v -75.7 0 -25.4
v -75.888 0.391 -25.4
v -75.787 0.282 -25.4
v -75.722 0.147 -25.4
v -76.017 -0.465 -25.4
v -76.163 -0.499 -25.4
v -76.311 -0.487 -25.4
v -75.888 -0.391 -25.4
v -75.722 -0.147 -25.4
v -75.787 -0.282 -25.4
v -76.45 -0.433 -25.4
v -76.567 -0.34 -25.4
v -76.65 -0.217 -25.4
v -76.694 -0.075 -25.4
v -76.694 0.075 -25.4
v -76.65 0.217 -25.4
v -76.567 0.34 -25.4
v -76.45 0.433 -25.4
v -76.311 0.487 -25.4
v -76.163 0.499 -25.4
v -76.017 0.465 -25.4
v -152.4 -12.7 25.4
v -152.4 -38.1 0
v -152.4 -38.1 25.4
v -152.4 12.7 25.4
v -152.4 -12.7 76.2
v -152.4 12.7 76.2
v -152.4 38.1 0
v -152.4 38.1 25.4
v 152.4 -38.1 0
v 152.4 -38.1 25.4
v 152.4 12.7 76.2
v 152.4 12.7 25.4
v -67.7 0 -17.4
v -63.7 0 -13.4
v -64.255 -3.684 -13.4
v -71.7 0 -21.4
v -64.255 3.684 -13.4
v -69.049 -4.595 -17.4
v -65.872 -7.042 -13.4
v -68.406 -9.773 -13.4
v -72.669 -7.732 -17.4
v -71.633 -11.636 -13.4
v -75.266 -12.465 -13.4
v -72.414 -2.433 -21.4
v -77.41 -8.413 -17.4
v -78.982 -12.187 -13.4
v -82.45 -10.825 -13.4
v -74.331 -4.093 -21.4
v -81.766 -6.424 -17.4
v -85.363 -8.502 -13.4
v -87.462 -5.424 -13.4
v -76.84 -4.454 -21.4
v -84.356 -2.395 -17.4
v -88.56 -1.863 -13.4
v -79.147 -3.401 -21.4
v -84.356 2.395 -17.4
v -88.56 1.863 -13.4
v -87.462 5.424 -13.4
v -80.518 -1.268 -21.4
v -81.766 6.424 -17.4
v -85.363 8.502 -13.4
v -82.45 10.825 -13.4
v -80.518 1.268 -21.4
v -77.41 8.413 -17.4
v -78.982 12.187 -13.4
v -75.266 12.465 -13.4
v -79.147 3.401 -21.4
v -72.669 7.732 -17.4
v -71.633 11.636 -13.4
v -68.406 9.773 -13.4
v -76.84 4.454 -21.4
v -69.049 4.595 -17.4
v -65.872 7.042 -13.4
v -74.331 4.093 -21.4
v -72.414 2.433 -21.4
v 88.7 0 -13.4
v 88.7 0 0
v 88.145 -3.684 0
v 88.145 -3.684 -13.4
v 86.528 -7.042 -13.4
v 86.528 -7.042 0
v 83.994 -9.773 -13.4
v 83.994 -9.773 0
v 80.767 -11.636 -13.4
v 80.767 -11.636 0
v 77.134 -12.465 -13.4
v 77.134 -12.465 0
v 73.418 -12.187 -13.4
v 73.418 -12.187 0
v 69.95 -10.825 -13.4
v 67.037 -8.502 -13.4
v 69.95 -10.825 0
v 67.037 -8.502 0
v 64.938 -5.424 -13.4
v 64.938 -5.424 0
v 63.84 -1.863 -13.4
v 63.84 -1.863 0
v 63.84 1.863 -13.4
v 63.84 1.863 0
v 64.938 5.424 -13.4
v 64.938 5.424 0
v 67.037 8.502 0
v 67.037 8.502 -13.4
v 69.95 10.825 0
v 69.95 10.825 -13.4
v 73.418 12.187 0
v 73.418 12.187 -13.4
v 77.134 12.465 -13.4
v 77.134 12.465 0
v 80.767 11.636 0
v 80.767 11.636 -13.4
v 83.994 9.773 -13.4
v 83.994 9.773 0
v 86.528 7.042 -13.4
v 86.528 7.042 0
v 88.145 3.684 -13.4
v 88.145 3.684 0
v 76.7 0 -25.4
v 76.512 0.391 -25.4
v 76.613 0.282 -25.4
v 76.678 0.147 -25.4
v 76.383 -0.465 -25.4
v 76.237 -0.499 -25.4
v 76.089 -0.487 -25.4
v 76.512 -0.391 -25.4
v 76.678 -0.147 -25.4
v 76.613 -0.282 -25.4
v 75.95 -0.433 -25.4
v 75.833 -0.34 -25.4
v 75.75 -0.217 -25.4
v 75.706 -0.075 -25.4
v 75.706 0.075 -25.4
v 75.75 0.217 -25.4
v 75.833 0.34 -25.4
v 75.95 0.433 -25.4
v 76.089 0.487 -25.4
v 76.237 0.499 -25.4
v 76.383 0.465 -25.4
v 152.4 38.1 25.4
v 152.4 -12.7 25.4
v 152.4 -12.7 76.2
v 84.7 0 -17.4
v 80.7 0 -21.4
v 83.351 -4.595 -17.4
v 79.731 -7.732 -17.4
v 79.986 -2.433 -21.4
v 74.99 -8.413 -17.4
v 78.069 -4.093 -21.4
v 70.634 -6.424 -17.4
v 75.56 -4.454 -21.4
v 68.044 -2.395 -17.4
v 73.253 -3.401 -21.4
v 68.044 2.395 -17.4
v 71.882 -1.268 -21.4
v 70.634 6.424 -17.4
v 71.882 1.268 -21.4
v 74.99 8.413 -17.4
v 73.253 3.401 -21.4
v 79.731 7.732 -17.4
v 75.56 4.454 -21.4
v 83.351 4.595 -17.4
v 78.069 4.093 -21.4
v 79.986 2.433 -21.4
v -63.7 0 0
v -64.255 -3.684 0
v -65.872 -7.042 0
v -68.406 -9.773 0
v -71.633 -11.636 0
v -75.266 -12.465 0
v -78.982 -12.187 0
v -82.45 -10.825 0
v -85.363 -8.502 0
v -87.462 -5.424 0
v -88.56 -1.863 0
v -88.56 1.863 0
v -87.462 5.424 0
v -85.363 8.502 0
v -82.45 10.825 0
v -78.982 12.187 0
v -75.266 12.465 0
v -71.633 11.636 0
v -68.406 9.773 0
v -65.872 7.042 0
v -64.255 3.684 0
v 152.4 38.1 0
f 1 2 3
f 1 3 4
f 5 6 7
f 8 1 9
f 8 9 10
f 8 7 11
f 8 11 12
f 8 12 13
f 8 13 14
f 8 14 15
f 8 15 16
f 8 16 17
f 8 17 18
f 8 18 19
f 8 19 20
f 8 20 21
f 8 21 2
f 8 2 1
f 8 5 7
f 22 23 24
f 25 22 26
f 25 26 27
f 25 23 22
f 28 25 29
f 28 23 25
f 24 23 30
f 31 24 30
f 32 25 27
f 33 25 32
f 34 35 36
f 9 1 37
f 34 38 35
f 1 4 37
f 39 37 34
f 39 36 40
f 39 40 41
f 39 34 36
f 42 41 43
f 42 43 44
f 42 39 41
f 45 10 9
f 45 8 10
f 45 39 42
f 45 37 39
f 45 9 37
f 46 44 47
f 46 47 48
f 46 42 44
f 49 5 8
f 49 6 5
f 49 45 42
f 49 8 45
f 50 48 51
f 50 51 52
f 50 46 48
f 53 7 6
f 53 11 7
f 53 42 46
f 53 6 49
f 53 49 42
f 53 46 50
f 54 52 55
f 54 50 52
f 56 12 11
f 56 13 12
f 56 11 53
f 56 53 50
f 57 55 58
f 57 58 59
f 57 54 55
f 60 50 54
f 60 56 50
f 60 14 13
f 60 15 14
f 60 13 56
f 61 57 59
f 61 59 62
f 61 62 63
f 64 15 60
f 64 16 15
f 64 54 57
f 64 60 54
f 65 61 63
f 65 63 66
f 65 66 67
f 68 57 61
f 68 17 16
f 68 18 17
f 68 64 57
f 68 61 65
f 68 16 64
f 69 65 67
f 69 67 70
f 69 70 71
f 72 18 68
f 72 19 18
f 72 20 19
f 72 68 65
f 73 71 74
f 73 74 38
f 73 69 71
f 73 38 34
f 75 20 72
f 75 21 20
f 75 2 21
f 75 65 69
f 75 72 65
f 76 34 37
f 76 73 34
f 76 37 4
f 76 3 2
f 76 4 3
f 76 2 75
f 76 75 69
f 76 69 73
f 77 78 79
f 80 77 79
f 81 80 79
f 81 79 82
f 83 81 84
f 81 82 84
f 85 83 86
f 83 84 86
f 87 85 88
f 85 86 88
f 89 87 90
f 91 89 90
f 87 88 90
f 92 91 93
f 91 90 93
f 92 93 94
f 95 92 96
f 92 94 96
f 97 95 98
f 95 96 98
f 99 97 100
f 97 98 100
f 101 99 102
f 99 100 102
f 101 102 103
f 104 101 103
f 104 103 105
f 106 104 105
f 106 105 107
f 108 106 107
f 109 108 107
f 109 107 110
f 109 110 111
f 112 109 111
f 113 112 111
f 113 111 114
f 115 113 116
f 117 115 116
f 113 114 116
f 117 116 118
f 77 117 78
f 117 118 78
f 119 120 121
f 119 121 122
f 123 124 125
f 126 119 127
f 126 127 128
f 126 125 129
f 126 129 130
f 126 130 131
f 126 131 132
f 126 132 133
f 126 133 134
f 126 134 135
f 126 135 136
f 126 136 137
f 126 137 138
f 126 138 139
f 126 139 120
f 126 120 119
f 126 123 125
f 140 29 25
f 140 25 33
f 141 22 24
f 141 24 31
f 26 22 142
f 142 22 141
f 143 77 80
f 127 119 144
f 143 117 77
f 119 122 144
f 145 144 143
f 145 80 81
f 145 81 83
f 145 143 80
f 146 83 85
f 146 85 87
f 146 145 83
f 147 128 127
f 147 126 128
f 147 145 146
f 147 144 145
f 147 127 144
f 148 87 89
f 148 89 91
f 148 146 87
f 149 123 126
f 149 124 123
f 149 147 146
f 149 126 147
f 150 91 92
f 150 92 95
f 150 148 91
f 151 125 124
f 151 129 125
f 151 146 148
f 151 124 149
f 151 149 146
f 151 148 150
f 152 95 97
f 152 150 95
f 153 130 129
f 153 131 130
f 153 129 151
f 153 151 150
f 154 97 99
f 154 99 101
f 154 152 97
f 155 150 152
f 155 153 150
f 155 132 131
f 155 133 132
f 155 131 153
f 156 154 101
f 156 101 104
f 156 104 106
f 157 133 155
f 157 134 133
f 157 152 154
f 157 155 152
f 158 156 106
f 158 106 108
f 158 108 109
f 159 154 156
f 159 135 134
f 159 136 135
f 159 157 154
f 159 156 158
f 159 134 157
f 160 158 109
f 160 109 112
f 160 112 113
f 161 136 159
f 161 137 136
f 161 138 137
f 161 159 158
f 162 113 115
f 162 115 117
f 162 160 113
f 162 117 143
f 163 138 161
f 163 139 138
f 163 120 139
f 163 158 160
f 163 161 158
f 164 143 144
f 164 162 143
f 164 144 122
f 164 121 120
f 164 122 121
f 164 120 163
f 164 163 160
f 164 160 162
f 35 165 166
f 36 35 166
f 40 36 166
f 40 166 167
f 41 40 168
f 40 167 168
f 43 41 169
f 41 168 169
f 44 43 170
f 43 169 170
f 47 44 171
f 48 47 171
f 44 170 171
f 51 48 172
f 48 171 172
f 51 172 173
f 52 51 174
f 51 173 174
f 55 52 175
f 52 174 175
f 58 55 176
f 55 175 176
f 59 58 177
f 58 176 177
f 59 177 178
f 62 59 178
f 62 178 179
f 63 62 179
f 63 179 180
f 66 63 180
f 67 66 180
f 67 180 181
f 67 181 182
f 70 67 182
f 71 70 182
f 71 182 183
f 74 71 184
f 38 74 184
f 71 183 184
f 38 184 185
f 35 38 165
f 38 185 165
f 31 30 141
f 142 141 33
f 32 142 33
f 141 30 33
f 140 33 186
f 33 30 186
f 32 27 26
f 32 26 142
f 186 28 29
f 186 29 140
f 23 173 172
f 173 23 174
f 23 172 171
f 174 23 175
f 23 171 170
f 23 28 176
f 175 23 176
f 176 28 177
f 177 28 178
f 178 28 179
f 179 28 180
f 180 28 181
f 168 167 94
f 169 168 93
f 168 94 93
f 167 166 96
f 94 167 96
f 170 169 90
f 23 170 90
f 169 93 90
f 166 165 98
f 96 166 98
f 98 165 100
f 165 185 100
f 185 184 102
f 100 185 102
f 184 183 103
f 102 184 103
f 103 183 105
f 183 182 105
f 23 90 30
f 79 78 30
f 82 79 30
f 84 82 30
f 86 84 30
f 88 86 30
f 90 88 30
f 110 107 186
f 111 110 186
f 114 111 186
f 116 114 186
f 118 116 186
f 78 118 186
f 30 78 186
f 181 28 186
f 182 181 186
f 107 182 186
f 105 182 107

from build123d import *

# Parameters (mm, degrees)
F0_W     = 304.8
F0_H     = 76.2
F1_DEPTH = 25.4
F2_W     = 304.8
F2_H     = 25.4
F3_DEPTH = 50.8
F4_R     = 12.5
F5_DEPTH = 25.4
F6_SIZE  = 12


with BuildPart() as f1:
    # F0 (on Top) → F1 (new body)
    with BuildSketch(Plane.XY):
        Rectangle(F0_W, F0_H)
    extrude(amount=F1_DEPTH)

    # F2 (on face) → F3 (join)
    with BuildSketch(Plane.XY.offset(25.4)):
        Rectangle(F2_W, F2_H)
    extrude(amount=F3_DEPTH)

    # F4 (on face) → F5 (join)
    with BuildSketch(Plane(origin=(0, 0, 0), x_dir=(1, 0, 0), z_dir=(0, 0, -1))):
        with Locations((-76.2, 0)):
            Circle(F4_R)
        with Locations((76.2, 0)):
            Circle(F4_R)
    extrude(amount=F5_DEPTH)

    # F6
    f6_edges = [f1.edges().sort_by_distance(p)[0] for p in [
        (-88.7, 0, -25.4),
        (63.7, 0, -25.4),
    ]]
    chamfer(f6_edges, length=F6_SIZE)


solid = f1.part
